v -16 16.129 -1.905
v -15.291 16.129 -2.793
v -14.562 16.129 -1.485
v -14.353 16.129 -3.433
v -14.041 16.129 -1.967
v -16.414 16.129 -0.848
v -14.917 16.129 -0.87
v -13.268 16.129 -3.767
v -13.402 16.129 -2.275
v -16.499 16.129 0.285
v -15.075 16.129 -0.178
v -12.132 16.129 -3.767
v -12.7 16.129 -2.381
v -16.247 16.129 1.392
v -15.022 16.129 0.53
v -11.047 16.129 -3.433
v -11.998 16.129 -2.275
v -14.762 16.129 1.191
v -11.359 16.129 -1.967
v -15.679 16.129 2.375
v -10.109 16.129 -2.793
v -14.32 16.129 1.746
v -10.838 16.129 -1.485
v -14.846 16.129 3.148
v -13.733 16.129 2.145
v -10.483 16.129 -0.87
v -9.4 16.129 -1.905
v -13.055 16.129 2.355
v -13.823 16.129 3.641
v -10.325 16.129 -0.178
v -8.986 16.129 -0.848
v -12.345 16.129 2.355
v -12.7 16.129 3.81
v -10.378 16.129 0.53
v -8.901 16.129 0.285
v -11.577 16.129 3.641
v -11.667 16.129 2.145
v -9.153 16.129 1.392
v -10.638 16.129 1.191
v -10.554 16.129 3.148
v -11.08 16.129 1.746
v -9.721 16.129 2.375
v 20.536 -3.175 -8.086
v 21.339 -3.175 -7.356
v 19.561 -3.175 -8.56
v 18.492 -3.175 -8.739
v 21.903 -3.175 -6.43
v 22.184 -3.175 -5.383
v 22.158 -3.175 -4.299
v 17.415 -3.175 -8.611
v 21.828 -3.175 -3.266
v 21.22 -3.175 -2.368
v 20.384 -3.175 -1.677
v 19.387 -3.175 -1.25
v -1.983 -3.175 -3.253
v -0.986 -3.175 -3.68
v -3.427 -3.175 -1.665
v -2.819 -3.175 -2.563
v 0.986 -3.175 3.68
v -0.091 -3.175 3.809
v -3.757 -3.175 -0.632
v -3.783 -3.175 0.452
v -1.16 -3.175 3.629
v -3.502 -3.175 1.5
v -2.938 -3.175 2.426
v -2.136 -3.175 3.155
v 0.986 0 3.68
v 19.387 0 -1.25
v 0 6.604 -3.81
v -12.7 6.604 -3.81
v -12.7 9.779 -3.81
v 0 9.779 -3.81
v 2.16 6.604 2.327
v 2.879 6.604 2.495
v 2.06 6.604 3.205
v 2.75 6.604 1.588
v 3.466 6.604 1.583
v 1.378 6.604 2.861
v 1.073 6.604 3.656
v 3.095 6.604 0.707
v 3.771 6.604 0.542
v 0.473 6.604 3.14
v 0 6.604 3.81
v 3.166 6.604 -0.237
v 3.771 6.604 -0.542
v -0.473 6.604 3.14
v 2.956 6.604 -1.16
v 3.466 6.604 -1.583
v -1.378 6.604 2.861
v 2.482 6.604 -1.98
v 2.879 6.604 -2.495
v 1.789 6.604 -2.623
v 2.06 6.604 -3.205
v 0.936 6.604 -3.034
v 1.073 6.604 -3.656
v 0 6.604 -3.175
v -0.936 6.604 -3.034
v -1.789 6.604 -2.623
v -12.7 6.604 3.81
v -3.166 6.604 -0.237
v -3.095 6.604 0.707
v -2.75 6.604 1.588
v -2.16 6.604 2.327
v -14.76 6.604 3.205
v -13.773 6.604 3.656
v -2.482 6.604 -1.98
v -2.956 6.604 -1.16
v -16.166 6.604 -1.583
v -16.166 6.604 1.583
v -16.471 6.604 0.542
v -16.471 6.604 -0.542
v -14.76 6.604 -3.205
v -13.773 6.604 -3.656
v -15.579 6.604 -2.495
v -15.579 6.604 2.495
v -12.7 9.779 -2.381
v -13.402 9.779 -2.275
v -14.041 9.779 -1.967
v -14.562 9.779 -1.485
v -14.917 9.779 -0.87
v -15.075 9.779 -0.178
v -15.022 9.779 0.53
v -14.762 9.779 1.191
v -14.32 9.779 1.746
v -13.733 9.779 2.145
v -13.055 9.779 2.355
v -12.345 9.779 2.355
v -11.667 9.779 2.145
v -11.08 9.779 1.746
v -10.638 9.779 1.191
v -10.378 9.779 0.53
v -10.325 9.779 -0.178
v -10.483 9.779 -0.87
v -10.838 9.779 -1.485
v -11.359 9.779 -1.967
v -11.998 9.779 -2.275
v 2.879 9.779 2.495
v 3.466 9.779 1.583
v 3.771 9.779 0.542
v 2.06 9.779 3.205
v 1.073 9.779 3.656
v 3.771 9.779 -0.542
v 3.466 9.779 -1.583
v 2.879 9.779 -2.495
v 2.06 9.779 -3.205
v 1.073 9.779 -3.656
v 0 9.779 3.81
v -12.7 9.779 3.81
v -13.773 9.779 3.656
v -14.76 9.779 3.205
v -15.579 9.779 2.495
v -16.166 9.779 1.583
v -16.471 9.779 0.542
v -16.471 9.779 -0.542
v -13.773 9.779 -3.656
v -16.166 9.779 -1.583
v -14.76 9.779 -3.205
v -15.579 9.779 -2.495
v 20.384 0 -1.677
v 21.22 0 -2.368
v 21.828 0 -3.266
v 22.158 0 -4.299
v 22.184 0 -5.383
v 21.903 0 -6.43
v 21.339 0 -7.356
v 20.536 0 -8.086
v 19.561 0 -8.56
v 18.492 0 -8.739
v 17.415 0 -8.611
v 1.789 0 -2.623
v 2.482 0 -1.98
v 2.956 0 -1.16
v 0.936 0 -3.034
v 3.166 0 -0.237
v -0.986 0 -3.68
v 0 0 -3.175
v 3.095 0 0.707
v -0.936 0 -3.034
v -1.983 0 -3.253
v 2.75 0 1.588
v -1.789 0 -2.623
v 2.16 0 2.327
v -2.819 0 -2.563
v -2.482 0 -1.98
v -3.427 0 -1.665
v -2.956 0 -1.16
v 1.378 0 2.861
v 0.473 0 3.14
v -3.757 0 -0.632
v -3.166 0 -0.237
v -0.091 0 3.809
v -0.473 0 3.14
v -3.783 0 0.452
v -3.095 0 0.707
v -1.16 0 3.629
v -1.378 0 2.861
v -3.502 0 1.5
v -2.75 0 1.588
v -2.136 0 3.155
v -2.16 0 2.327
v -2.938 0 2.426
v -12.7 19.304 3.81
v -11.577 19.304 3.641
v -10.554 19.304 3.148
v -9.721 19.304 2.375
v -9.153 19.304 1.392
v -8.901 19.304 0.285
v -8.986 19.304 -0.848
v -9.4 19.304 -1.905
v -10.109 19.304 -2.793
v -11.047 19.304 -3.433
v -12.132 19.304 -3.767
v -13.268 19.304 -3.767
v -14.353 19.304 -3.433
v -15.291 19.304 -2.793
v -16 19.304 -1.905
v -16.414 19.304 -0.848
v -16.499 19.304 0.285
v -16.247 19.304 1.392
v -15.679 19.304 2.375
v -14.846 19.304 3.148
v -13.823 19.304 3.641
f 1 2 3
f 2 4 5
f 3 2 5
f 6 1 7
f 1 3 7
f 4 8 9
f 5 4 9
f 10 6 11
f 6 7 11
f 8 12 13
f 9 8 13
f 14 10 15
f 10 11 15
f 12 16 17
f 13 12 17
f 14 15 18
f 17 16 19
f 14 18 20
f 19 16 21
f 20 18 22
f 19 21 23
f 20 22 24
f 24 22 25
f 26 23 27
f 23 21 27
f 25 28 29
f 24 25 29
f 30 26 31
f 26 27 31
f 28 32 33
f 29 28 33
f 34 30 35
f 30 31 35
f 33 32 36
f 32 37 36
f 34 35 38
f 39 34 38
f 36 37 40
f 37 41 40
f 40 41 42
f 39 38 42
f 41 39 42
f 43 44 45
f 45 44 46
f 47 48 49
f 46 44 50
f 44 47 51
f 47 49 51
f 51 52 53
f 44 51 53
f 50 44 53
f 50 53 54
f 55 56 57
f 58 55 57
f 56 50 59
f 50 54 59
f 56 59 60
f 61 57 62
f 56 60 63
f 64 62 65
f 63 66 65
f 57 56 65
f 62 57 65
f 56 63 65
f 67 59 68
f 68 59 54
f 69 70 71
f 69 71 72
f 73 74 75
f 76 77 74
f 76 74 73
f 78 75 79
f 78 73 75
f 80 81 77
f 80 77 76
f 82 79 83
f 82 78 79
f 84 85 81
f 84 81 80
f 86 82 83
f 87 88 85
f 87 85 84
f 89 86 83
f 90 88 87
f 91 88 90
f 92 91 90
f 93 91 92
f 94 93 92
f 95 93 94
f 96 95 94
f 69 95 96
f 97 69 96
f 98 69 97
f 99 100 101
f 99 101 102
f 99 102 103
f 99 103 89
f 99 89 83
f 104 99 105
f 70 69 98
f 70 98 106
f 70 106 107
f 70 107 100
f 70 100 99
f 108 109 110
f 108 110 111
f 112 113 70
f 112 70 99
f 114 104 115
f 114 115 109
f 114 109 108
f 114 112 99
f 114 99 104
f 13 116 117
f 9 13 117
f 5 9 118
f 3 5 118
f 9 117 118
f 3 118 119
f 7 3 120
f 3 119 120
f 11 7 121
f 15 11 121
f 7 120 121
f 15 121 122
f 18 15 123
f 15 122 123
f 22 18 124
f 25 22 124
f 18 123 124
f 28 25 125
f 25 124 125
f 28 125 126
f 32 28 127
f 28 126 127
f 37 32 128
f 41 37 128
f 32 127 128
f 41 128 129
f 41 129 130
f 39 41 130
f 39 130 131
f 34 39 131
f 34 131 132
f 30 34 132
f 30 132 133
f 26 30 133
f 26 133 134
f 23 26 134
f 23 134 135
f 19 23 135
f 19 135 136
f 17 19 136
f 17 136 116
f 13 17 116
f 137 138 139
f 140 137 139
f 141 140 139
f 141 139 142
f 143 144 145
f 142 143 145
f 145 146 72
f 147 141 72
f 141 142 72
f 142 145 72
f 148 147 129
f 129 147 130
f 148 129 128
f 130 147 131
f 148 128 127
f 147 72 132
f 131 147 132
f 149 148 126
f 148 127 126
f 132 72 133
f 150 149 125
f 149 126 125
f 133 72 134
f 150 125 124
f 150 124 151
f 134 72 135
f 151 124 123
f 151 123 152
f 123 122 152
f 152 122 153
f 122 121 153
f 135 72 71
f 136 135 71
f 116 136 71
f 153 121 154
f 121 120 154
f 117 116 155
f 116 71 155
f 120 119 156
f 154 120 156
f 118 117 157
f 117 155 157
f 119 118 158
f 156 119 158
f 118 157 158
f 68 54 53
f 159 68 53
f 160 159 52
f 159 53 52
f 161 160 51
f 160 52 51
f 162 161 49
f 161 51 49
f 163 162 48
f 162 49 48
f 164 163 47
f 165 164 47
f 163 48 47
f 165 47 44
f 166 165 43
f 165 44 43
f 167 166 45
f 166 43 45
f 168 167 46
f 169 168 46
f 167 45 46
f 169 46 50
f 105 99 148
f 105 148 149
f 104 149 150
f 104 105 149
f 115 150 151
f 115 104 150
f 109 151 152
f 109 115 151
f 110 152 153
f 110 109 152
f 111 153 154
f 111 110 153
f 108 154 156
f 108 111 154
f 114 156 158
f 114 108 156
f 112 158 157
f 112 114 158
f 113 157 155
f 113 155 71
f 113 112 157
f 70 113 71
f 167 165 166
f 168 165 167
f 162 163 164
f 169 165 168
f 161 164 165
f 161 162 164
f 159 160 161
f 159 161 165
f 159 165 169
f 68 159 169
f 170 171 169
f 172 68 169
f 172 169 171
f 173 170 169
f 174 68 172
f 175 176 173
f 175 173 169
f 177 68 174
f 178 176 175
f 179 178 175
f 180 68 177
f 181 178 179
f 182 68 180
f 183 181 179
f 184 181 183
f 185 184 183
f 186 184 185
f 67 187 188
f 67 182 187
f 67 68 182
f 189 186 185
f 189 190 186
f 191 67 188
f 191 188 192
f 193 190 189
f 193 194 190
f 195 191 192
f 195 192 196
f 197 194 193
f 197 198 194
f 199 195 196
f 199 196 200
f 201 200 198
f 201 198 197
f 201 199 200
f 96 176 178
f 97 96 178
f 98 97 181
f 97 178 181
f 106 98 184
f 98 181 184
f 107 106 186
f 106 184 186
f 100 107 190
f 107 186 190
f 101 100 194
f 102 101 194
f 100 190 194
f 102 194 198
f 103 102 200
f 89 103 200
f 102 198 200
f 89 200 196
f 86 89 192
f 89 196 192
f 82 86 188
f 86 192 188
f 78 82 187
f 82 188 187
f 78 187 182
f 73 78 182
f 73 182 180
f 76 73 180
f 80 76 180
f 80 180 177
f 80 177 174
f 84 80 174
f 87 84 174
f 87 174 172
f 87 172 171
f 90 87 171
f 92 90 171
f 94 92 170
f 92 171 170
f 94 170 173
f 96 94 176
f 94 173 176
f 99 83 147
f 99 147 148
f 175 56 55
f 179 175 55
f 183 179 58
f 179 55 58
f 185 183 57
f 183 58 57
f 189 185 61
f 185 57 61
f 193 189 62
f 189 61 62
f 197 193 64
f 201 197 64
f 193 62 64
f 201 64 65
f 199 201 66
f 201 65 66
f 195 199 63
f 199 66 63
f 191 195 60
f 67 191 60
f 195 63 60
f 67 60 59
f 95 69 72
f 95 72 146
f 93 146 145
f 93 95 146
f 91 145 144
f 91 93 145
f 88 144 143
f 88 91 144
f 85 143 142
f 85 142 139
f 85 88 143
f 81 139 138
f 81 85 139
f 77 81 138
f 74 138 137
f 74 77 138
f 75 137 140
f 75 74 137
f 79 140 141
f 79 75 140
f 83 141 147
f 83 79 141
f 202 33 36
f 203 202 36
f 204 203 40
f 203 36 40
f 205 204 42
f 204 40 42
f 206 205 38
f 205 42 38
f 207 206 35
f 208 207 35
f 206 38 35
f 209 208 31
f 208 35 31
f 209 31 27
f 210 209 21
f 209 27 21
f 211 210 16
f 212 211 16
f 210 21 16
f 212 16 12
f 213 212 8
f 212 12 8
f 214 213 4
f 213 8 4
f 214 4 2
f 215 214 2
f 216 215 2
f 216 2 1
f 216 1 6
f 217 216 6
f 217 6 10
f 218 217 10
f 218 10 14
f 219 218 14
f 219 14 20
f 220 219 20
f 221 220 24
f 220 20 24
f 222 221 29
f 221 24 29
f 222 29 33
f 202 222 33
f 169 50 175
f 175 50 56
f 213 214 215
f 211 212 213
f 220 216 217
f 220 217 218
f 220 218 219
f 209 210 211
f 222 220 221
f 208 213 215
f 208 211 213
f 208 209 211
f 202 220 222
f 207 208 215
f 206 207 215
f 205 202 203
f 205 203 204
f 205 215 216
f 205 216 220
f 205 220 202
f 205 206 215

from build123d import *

# Parameters (mm, degrees)
SKETCH1_R           = 3.175
BOSS_EXTRUDE1_DEPTH = 6.604
SKETCH2_R           = 2.38125
BOSS_EXTRUDE2_DEPTH = 3.175
SKETCH2_3_R         = 2.38125
BOSS_EXTRUDE3_DEPTH = 9.525
SKETCH4_R           = 3.81
BOSS_EXTRUDE4_DEPTH = 3.175
BOSS_EXTRUDE5_START = 3.175
BOSS_EXTRUDE5_DEPTH = 3.175


with BuildPart() as part:
    # Sketch1 → Boss-Extrude1 (new body)
    with BuildSketch(Plane(origin=(0, 0, 0), x_dir=(1, 0, 0), z_dir=(0, 1, 0))):
        Circle(SKETCH1_R)
    extrude(amount=BOSS_EXTRUDE1_DEPTH)

    # Sketch2 → Boss-Extrude2 (add)
    with BuildSketch(Plane(origin=(0, 6.604, 0), x_dir=(1, 0, 0), z_dir=(0, 1, 0))):
        with BuildLine():
            Line((0, -3.81), (-12.7, -3.81))
            ThreePointArc((-12.7, -3.81), (-16.51, 0), (-12.7, 3.81))
            Line((-12.7, 3.81), (0, 3.81))
            ThreePointArc((0, 3.81), (3.81, 0), (0, -3.81))
        make_face()
        with Locations((-12.7, 0)):
            Circle(SKETCH2_R, mode=Mode.SUBTRACT)
    extrude(amount=BOSS_EXTRUDE2_DEPTH)

    # Sketch2<3> → Boss-Extrude3 (add)
    with BuildSketch(Plane(origin=(0, 6.604, 0), x_dir=(1, 0, 0), z_dir=(0, 1, 0))):
        with Locations((-12.7, 0)):
            Circle(SKETCH2_3_R)
    extrude(amount=BOSS_EXTRUDE3_DEPTH)

    # Sketch4 → Boss-Extrude4 (add)
    with BuildSketch(Plane(origin=(0, 16.129, 0), x_dir=(1, 0, 0), z_dir=(0, 1, 0))):
        with Locations((-12.7, 0)):
            Circle(SKETCH4_R)
    extrude(amount=BOSS_EXTRUDE4_DEPTH)

    # Sketch5 → Boss-Extrude5 (add)
    with BuildSketch(Plane.XZ.offset(BOSS_EXTRUDE5_START)):
        with BuildLine():
            Line((0.986100562, 3.680177398), (19.386987553, -1.250325411))
            ThreePointArc((19.386987553, -1.250325411), (22.081064389, -5.916603371), (17.414786429, -8.610680207))
            Line((17.414786429, -8.610680207), (-0.986100562, -3.680177398))
            ThreePointArc((-0.986100562, -3.680177398), (-3.680177398, 0.986100562), (0.986100562, 3.680177398))
        make_face()
    extrude(amount=-BOSS_EXTRUDE5_DEPTH)


solid = part.part
